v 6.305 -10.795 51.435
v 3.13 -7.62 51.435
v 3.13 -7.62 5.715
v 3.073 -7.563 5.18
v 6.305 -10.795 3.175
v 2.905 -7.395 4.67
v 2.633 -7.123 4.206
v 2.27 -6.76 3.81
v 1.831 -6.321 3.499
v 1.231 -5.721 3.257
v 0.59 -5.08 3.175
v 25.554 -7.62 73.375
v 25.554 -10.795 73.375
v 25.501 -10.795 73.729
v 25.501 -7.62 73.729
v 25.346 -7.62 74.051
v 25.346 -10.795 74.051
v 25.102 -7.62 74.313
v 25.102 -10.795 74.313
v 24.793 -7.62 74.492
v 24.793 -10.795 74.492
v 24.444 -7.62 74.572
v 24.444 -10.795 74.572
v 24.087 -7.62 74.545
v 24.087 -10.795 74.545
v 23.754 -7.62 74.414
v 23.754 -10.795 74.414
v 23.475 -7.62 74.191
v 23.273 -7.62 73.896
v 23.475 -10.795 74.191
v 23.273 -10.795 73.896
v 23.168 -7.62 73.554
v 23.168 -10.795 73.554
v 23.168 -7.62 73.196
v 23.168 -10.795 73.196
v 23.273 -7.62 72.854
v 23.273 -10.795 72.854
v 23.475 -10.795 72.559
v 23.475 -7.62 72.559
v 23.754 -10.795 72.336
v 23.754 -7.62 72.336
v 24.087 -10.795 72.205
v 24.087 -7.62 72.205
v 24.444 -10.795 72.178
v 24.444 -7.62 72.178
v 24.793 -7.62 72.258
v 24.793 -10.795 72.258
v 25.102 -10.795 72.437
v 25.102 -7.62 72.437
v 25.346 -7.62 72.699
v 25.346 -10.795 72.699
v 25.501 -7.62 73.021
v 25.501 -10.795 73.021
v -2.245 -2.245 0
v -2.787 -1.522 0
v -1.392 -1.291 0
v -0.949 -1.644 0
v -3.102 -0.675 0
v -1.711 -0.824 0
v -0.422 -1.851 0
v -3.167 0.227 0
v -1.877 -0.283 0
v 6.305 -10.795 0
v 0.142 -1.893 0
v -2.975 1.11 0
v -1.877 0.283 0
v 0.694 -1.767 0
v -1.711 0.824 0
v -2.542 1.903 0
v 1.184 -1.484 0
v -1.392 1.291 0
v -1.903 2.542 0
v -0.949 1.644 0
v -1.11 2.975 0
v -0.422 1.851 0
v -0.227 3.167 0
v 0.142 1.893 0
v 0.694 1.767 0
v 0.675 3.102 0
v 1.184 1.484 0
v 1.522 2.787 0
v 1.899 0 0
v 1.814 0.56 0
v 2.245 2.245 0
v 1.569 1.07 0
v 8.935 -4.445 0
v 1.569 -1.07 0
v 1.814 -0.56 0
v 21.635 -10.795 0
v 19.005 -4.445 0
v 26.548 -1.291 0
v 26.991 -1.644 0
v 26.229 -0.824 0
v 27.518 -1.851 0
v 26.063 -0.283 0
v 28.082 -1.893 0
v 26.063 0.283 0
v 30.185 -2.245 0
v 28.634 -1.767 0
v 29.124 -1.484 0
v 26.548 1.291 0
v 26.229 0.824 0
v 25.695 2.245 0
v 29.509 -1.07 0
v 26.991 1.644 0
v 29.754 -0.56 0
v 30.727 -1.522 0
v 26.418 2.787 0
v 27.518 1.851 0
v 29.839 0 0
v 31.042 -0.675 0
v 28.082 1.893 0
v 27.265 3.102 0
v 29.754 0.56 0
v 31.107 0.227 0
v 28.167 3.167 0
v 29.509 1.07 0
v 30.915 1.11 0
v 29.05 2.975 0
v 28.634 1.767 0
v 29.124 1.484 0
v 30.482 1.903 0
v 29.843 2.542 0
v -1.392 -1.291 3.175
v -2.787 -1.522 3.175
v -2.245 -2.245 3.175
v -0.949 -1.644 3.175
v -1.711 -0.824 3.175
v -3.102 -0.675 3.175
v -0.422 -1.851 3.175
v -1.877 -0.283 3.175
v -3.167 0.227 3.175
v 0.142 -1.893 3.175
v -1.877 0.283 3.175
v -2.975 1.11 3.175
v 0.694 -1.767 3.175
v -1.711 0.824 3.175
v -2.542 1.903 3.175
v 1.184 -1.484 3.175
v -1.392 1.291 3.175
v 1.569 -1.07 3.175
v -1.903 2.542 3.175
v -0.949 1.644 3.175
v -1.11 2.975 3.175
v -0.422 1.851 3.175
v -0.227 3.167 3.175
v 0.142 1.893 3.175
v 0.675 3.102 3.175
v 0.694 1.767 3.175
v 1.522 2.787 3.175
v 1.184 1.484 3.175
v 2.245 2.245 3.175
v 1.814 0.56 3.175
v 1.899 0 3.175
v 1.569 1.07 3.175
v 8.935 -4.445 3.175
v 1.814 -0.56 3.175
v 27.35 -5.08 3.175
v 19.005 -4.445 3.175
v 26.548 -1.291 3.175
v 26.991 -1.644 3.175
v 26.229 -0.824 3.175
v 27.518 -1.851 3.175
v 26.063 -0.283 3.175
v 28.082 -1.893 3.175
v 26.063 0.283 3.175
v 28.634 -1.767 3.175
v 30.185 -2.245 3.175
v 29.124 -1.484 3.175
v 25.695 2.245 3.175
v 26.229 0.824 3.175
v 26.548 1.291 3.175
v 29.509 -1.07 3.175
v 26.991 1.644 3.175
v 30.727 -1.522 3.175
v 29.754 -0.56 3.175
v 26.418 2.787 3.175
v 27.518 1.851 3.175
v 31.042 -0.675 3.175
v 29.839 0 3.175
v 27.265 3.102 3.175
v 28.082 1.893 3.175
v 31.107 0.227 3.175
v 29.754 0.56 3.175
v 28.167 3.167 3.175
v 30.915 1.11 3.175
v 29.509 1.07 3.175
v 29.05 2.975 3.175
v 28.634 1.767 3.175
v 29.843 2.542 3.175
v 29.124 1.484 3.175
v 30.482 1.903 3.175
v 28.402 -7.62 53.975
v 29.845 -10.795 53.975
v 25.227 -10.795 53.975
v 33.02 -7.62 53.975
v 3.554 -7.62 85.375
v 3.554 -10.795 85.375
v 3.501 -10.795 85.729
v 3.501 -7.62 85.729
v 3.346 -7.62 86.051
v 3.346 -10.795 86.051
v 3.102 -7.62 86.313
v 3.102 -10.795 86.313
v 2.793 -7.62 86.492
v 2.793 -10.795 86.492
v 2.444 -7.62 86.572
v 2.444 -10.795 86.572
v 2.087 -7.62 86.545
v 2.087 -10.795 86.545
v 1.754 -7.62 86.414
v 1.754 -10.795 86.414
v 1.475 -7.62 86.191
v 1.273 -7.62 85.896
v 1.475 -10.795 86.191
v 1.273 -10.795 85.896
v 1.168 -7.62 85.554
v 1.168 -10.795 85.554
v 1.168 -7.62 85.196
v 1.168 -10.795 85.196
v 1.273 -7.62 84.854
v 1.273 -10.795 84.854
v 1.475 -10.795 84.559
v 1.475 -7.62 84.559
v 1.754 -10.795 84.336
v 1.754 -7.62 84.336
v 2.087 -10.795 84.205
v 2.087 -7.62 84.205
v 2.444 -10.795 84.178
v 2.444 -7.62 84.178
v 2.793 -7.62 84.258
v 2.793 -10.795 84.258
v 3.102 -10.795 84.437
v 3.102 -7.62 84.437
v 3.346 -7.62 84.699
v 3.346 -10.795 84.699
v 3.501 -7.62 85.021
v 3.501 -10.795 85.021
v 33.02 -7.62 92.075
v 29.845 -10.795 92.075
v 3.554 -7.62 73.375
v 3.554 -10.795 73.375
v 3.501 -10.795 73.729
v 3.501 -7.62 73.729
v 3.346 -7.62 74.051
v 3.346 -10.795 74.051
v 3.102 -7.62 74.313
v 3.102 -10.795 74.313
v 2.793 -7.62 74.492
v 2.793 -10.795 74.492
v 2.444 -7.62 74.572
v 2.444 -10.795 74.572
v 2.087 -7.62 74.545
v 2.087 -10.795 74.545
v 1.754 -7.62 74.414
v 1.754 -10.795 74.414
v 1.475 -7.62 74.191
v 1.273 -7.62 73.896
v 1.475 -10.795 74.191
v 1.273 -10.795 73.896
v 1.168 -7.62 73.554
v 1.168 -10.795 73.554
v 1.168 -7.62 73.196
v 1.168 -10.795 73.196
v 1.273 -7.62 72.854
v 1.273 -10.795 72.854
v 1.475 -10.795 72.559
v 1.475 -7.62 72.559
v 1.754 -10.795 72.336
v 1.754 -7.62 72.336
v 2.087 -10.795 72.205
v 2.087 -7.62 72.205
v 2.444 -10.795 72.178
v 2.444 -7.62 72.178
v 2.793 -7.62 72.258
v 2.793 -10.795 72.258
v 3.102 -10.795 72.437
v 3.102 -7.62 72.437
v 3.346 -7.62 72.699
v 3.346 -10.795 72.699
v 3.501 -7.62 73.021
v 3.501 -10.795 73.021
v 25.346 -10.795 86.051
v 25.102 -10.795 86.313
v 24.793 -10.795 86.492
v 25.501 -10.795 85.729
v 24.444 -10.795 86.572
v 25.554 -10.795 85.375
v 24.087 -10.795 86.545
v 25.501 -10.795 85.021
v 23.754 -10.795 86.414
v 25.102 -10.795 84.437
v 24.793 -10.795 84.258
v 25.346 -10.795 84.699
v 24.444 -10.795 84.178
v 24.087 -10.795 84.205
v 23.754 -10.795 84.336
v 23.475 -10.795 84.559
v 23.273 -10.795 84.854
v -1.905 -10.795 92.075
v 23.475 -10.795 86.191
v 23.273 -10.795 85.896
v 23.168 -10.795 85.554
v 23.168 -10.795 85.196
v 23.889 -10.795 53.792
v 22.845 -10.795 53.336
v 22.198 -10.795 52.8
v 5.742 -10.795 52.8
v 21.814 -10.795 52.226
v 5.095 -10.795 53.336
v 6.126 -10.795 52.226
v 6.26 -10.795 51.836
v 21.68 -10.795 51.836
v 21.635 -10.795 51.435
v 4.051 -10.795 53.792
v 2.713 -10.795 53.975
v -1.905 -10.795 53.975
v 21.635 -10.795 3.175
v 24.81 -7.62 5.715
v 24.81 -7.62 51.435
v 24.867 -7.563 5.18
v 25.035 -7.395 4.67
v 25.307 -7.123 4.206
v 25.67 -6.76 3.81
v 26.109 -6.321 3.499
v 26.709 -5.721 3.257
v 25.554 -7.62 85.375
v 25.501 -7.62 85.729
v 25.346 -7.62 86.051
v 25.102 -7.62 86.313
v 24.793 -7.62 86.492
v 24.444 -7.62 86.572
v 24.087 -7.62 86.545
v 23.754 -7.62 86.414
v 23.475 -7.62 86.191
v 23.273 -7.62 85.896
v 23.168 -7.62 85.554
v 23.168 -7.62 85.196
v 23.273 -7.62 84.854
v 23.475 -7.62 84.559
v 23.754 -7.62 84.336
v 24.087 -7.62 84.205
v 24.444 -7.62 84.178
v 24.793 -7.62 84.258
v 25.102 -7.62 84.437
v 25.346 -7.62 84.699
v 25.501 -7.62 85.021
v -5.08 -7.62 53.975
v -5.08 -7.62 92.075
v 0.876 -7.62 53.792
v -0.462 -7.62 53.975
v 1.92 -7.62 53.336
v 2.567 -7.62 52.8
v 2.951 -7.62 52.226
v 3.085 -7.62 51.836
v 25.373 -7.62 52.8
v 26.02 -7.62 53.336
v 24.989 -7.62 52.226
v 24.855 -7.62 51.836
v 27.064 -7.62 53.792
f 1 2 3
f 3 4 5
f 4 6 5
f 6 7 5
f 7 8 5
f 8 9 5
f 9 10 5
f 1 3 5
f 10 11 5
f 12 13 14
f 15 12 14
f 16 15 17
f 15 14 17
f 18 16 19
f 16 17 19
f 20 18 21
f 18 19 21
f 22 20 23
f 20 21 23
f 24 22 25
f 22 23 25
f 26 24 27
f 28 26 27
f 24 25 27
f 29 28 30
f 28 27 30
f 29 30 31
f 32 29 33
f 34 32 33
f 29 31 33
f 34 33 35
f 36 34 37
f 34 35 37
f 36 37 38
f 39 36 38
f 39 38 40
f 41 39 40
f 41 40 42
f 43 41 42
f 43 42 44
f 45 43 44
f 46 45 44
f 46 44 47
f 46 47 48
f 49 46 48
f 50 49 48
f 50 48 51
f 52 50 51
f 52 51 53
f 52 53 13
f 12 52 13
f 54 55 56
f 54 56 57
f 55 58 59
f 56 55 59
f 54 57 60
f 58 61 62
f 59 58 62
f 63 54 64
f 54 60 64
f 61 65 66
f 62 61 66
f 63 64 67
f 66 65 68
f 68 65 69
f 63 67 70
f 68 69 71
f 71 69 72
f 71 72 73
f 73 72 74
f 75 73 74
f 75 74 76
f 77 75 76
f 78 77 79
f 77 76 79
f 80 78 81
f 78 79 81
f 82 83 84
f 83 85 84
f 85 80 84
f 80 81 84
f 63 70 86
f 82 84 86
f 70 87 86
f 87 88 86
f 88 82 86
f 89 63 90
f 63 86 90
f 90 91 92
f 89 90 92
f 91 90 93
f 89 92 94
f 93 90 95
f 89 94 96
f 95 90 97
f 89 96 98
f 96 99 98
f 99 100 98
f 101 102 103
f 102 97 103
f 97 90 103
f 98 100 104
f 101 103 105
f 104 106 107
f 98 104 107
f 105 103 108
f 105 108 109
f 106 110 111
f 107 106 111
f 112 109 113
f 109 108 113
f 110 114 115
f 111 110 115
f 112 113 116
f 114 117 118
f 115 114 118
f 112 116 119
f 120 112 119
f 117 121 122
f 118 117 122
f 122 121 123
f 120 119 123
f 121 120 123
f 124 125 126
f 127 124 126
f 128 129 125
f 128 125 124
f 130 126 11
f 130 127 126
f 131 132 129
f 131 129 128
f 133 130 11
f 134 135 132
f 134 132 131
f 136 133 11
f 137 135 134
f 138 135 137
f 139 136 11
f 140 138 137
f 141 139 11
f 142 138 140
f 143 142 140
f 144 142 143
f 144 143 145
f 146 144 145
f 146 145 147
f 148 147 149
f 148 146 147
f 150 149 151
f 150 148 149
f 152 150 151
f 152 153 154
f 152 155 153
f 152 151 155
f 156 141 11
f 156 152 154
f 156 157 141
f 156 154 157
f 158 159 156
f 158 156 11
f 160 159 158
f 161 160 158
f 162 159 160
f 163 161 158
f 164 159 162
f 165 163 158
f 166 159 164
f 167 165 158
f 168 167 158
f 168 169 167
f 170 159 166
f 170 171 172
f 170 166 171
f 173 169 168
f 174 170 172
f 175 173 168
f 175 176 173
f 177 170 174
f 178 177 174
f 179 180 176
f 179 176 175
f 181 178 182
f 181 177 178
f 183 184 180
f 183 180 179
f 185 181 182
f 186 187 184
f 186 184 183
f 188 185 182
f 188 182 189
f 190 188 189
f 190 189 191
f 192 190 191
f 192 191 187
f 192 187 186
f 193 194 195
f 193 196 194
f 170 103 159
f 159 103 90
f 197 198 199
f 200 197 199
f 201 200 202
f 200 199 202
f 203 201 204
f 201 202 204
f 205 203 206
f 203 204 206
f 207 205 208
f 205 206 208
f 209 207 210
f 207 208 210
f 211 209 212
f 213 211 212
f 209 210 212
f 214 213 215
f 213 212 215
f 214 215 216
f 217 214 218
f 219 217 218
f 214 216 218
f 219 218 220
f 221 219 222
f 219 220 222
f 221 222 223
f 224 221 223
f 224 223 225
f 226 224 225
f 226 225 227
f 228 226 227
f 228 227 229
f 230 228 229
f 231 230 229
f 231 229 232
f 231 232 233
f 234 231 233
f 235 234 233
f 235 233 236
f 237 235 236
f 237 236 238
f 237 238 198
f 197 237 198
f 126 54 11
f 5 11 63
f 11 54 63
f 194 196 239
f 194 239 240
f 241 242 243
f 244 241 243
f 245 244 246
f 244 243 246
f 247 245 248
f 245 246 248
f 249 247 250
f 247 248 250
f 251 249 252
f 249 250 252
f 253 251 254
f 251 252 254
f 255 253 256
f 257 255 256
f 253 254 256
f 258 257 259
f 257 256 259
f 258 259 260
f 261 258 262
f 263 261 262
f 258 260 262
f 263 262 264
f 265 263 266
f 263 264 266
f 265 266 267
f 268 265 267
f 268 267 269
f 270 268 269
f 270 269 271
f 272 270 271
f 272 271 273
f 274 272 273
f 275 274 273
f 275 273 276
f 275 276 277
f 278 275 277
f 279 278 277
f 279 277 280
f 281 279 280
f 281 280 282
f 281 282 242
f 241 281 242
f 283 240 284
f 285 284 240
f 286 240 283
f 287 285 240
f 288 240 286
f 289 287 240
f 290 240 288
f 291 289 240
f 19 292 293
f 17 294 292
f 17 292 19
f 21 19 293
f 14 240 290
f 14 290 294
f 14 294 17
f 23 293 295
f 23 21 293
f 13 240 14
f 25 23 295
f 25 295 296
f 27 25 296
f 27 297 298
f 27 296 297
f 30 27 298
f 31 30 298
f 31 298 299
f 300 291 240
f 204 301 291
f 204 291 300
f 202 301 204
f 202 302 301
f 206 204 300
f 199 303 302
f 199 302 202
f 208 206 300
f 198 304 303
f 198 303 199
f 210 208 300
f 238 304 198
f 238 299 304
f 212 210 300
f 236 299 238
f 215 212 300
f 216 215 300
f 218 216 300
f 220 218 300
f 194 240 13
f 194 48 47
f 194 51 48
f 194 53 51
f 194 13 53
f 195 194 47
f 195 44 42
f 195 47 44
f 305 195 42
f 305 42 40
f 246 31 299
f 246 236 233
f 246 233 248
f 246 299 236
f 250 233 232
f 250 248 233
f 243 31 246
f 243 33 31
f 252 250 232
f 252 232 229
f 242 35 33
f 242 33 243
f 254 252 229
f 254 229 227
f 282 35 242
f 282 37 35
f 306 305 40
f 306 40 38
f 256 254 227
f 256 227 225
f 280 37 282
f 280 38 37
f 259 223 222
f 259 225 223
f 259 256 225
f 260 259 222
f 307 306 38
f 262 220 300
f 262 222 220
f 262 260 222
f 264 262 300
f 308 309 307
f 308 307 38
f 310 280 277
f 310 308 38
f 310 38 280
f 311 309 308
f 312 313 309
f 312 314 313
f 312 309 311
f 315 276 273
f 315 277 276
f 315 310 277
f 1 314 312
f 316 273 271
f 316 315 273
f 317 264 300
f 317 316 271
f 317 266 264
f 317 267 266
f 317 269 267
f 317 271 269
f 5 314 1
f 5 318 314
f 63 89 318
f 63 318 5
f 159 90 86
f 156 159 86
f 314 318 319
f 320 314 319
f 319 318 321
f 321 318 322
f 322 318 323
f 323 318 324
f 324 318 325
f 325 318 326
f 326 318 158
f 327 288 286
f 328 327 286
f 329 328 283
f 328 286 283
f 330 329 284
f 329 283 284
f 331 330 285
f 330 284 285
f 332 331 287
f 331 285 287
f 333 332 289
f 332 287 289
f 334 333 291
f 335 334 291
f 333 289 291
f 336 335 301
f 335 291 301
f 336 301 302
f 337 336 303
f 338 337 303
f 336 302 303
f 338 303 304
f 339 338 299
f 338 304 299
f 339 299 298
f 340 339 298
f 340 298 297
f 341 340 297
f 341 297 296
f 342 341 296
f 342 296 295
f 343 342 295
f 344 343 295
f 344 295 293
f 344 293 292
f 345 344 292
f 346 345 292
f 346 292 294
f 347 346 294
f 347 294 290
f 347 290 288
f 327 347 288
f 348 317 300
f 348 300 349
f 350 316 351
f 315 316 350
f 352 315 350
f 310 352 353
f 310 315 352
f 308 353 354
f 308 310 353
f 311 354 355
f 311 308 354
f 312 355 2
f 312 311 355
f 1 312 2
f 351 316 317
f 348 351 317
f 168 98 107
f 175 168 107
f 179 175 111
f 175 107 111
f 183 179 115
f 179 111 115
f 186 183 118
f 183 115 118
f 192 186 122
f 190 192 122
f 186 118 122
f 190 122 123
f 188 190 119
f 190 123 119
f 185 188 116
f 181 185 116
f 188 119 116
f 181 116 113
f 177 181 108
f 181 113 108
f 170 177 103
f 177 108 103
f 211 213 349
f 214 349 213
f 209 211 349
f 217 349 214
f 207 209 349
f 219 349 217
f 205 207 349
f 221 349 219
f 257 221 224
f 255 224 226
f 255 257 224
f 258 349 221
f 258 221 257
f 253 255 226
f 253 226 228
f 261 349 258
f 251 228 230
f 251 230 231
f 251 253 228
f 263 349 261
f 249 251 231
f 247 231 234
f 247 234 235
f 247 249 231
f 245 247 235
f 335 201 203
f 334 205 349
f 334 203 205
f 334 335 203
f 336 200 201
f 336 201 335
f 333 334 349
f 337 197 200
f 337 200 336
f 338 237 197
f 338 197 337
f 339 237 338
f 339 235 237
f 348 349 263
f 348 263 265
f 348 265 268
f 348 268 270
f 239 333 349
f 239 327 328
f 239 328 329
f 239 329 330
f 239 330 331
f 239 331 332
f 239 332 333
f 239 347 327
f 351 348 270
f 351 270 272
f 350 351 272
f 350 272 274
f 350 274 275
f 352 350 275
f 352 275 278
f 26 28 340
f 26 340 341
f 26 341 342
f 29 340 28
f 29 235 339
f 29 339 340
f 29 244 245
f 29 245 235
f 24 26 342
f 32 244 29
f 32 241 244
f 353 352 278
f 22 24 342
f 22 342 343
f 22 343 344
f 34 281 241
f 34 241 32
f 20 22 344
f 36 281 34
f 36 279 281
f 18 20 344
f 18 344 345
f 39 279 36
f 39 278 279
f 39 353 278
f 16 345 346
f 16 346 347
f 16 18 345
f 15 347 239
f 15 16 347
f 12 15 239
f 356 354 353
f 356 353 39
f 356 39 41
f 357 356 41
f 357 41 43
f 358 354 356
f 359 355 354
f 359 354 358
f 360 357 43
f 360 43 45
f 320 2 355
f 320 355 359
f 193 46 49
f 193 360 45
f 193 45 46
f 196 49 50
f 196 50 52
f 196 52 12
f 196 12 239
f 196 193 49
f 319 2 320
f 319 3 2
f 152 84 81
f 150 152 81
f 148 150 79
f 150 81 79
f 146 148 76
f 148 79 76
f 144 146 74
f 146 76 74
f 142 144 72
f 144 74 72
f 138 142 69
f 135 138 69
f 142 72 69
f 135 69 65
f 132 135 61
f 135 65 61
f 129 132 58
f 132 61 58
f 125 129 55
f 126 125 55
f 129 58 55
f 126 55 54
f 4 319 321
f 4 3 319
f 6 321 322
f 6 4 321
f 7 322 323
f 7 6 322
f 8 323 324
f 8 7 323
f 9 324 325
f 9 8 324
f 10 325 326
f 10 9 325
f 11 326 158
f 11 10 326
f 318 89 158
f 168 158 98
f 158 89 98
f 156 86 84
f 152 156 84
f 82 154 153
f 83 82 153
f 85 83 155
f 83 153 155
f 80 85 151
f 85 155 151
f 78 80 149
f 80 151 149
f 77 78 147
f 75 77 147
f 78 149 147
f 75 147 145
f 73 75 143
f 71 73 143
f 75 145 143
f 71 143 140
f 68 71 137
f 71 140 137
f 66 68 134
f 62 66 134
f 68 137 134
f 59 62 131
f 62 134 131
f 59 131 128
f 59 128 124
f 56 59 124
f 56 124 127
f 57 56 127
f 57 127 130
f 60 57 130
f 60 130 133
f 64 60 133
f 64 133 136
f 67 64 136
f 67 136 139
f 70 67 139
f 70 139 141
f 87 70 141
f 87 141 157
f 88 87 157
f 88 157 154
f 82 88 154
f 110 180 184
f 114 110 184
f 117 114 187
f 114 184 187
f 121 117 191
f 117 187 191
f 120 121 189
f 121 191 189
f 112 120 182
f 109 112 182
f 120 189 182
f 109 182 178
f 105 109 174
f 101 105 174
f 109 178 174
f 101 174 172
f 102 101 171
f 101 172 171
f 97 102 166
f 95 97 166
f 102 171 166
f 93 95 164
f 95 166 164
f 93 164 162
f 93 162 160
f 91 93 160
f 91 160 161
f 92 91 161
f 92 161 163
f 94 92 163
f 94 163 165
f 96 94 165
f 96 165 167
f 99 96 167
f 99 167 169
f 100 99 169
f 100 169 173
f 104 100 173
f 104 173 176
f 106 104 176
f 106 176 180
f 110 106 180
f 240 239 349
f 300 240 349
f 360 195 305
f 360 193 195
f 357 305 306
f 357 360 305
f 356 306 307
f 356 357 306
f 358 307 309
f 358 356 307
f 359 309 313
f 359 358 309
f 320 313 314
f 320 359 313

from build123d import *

# Parameters (mm, degrees)
BOSS_EXTRUDE1_DEPTH       = 3.175
SKETCH2_W                 = 15.330256122
SKETCH2_H                 = 3.175
BOSS_EXTRUDE2_DEPTH       = 50.8
FILLET1_R                 = 2.54
F_6_CLEARANCE_HOLE1_D     = 3.7973
F_6_CLEARANCE_HOLE1_DEPTH = 25.4
F_6_CLEARANCE_HOLE1_TIP   = 1.140824014
BOSS_EXTRUDE3_DEPTH       = 38.1
FILLET2_R                 = 2.54
M2_CLEARANCE_HOLE1_D      = 2.4
M2_CLEARANCE_HOLE1_DEPTH  = 25.4
M2_CLEARANCE_HOLE1_TIP    = 0.721032743


with BuildPart() as part:
    # Sketch1 → Boss-Extrude1 (new body)
    with BuildSketch(Plane.XY):
        with BuildLine():
            Line((-2.24506403, -2.24506403), (6.304871939, -10.795))
            Line((6.304871939, -10.795), (21.635128061, -10.795))
            Line((21.635128061, -10.795), (30.18506403, -2.24506403))
            ThreePointArc((30.18506403, -2.24506403), (30.18506403, 2.24506403), (25.69493597, 2.24506403))
            Line((25.69493597, 2.24506403), (19.004871939, -4.445))
            Line((19.004871939, -4.445), (8.935128061, -4.445))
            Line((8.935128061, -4.445), (2.24506403, 2.24506403))
            ThreePointArc((2.24506403, 2.24506403), (-2.24506403, 2.24506403), (-2.24506403, -2.24506403))
        make_face()
    extrude(amount=BOSS_EXTRUDE1_DEPTH)

    # Sketch2 → Boss-Extrude2 (add)
    with BuildSketch(Plane.XY.offset(3.175)):
        with Locations((13.97, -9.2075)):
            Rectangle(SKETCH2_W, SKETCH2_H)
        Polygon((3.129871939, -7.62), (6.304871939, -10.795), (6.304871939, -7.62), align=None)
        Polygon((21.635128061, -7.62), (21.635128061, -10.795), (24.810128061, -7.62), align=None)
    extrude(amount=BOSS_EXTRUDE2_DEPTH)

    # Fillet1
    fillet1_edges = [part.edges().sort_by_distance(p)[0] for p in [
        (13.97, -7.62, 3.175),
    ]]
    fillet(fillet1_edges, radius=FILLET1_R)

    # #6 Clearance Hole1
    with Locations(Plane(origin=(0, 0, 0), x_dir=(-1, 0, 0), z_dir=(0, 0, -1))):
        with Locations((-27.94, 0), (0, 0)):
            Hole(F_6_CLEARANCE_HOLE1_D / 2, depth=F_6_CLEARANCE_HOLE1_DEPTH)
            with Locations((0, 0, -(F_6_CLEARANCE_HOLE1_DEPTH + F_6_CLEARANCE_HOLE1_TIP / 2))):  # 118° drill point
                Cone(0, F_6_CLEARANCE_HOLE1_D / 2, F_6_CLEARANCE_HOLE1_TIP, mode=Mode.SUBTRACT)

    # Sketch7 → Boss-Extrude3 (add)
    with BuildSketch(Plane.XY.offset(53.975)):
        Polygon((-5.080004961, -7.62), (33.019995039, -7.62), (29.844995039, -10.795), (-1.905004961, -10.795), align=None)
    extrude(amount=BOSS_EXTRUDE3_DEPTH)

    # Fillet2
    fillet2_edges = [part.edges().sort_by_distance(p)[0] for p in [
        (4.717371939, -9.2075, 53.975),
        (23.222628061, -9.2075, 53.975),
    ]]
    fillet(fillet2_edges, radius=FILLET2_R)

    # M2 Clearance Hole1
    with Locations(Plane(origin=(0, -7.62, 0), x_dir=(-1, 0, 0), z_dir=(0, 1, 0))):
        with Locations((-2.354305281, 85.375), (-2.354305281, 73.375), (-24.354305281, 85.375), (-24.354305281, 73.375)):
            Hole(M2_CLEARANCE_HOLE1_D / 2, depth=M2_CLEARANCE_HOLE1_DEPTH)
            with Locations((0, 0, -(M2_CLEARANCE_HOLE1_DEPTH + M2_CLEARANCE_HOLE1_TIP / 2))):  # 118° drill point
                Cone(0, M2_CLEARANCE_HOLE1_D / 2, M2_CLEARANCE_HOLE1_TIP, mode=Mode.SUBTRACT)


solid = part.part
